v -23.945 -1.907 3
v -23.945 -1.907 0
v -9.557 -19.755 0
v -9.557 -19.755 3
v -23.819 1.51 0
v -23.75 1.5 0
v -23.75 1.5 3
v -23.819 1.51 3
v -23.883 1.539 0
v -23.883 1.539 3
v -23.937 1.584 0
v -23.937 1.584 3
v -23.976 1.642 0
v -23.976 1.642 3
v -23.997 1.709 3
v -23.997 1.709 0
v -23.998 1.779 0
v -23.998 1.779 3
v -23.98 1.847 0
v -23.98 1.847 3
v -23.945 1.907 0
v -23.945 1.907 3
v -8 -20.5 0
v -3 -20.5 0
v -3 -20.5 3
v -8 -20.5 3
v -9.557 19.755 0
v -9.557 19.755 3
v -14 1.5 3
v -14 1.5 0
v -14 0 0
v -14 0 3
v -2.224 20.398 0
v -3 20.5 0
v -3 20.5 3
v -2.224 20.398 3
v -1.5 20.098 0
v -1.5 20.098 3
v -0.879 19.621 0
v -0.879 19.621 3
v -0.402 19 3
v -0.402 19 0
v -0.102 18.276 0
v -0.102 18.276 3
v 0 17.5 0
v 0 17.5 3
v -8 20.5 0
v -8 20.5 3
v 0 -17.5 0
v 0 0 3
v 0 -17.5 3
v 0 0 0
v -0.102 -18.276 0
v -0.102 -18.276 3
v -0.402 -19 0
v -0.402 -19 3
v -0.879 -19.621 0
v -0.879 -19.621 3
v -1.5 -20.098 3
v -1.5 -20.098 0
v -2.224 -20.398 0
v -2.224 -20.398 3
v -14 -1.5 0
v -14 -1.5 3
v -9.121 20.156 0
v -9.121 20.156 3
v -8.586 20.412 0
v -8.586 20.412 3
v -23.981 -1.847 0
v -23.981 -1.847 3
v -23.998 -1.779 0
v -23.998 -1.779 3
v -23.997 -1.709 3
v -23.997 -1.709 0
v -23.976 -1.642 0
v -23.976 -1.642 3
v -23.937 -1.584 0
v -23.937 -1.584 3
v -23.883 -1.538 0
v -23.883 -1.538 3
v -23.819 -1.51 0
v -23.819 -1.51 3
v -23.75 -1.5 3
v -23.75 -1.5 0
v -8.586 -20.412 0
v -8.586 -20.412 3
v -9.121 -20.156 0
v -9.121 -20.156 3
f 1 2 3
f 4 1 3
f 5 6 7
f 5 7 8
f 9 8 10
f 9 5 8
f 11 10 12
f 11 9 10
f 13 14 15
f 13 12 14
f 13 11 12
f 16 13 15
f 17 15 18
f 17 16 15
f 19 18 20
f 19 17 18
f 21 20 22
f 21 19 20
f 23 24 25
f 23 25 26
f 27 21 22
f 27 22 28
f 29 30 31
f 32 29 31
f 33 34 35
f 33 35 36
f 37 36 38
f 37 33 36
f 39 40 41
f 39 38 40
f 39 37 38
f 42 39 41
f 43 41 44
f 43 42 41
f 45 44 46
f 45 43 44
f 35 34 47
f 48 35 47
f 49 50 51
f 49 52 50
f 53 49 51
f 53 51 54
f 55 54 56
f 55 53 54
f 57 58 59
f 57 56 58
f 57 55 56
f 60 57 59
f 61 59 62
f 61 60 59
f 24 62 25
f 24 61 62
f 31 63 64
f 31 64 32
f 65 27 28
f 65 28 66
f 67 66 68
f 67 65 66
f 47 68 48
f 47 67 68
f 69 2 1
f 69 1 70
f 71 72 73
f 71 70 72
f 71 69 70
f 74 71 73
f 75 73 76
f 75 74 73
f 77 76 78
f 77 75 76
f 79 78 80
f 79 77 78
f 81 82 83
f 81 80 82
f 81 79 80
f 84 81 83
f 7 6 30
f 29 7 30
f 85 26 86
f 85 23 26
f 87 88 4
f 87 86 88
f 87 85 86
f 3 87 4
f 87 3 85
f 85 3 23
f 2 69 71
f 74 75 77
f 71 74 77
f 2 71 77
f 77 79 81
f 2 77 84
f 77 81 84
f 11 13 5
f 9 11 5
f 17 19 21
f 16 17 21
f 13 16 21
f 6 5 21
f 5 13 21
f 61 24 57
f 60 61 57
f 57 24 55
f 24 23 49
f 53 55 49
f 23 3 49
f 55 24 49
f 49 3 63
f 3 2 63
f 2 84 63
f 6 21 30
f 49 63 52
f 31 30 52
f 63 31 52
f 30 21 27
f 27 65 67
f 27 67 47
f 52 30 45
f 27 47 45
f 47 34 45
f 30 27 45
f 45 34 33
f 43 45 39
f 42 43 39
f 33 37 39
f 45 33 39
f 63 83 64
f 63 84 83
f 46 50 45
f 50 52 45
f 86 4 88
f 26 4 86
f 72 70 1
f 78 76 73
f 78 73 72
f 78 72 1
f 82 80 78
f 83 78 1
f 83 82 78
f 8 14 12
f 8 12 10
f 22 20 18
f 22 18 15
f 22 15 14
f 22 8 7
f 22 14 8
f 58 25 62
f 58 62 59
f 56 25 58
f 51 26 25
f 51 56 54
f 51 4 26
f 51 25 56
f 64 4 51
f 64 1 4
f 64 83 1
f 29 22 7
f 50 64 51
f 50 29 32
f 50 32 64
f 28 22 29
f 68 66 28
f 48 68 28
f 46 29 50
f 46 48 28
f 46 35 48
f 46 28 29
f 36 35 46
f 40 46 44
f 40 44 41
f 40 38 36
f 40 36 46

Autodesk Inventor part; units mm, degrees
ref_plane "YZ Plane" through (0, 0, 0) normal (1, 0, 0) x (0, 1, 0)
ref_plane "XZ Plane" through (0, 0, 0) normal (0, 1, 0) x (-1, 0, 0)
ref_plane "XY Plane" through (0, 0, 0) normal (0, 0, 1) x (1, 0, 0)
sketch "Esboço1" plane through (0, 0, 0) normal (0, 0, 1) x (1, 0, 0)
  line L0 (0, 0) -> (0, 17.5)
  arc A0 (0, 17.5) -> (-3, 20.5) centre (-3, 17.5) ccw
  line L1 (-3, 20.5) -> (-8, 20.5)
  arc A1 (-8, 20.5) -> (-9.5571, 19.7552) centre (-8, 18.5) ccw
  line L2 (-23.75, 1.5) -> (-14, 1.5)
  line L3 (-14, 1.5) -> (-14, 0)
  arc A2 (-23.9446, 1.9069) -> (-23.75, 1.5) centre (-23.75, 1.75) ccw
  line L4 (-23.9446, 1.9069) -> (-9.5571, 19.7552)
  line L5 (0, 0) -> (0, -17.5)
  arc A3 (-3, -20.5) -> (0, -17.5) centre (-3, -17.5) ccw
  line L6 (-3, -20.5) -> (-8, -20.5)
  arc A4 (-9.5571, -19.7552) -> (-8, -20.5) centre (-8, -18.5) ccw
  line L7 (-23.75, -1.5) -> (-14, -1.5)
  line L8 (-14, -1.5) -> (-14, 0)
  arc A5 (-23.75, -1.5) -> (-23.9446, -1.9069) centre (-23.75, -1.75) ccw
  line L9 (-23.9446, -1.9069) -> (-9.5571, -19.7552)
  point P0 (-7, 0)
  point P1 (-5.5, 20.5)
  point P2 (-5.5, -20.5)
extrude "Extrusão1" add sketch "Esboço1" along normal blind 3
properties part number "LEME"
